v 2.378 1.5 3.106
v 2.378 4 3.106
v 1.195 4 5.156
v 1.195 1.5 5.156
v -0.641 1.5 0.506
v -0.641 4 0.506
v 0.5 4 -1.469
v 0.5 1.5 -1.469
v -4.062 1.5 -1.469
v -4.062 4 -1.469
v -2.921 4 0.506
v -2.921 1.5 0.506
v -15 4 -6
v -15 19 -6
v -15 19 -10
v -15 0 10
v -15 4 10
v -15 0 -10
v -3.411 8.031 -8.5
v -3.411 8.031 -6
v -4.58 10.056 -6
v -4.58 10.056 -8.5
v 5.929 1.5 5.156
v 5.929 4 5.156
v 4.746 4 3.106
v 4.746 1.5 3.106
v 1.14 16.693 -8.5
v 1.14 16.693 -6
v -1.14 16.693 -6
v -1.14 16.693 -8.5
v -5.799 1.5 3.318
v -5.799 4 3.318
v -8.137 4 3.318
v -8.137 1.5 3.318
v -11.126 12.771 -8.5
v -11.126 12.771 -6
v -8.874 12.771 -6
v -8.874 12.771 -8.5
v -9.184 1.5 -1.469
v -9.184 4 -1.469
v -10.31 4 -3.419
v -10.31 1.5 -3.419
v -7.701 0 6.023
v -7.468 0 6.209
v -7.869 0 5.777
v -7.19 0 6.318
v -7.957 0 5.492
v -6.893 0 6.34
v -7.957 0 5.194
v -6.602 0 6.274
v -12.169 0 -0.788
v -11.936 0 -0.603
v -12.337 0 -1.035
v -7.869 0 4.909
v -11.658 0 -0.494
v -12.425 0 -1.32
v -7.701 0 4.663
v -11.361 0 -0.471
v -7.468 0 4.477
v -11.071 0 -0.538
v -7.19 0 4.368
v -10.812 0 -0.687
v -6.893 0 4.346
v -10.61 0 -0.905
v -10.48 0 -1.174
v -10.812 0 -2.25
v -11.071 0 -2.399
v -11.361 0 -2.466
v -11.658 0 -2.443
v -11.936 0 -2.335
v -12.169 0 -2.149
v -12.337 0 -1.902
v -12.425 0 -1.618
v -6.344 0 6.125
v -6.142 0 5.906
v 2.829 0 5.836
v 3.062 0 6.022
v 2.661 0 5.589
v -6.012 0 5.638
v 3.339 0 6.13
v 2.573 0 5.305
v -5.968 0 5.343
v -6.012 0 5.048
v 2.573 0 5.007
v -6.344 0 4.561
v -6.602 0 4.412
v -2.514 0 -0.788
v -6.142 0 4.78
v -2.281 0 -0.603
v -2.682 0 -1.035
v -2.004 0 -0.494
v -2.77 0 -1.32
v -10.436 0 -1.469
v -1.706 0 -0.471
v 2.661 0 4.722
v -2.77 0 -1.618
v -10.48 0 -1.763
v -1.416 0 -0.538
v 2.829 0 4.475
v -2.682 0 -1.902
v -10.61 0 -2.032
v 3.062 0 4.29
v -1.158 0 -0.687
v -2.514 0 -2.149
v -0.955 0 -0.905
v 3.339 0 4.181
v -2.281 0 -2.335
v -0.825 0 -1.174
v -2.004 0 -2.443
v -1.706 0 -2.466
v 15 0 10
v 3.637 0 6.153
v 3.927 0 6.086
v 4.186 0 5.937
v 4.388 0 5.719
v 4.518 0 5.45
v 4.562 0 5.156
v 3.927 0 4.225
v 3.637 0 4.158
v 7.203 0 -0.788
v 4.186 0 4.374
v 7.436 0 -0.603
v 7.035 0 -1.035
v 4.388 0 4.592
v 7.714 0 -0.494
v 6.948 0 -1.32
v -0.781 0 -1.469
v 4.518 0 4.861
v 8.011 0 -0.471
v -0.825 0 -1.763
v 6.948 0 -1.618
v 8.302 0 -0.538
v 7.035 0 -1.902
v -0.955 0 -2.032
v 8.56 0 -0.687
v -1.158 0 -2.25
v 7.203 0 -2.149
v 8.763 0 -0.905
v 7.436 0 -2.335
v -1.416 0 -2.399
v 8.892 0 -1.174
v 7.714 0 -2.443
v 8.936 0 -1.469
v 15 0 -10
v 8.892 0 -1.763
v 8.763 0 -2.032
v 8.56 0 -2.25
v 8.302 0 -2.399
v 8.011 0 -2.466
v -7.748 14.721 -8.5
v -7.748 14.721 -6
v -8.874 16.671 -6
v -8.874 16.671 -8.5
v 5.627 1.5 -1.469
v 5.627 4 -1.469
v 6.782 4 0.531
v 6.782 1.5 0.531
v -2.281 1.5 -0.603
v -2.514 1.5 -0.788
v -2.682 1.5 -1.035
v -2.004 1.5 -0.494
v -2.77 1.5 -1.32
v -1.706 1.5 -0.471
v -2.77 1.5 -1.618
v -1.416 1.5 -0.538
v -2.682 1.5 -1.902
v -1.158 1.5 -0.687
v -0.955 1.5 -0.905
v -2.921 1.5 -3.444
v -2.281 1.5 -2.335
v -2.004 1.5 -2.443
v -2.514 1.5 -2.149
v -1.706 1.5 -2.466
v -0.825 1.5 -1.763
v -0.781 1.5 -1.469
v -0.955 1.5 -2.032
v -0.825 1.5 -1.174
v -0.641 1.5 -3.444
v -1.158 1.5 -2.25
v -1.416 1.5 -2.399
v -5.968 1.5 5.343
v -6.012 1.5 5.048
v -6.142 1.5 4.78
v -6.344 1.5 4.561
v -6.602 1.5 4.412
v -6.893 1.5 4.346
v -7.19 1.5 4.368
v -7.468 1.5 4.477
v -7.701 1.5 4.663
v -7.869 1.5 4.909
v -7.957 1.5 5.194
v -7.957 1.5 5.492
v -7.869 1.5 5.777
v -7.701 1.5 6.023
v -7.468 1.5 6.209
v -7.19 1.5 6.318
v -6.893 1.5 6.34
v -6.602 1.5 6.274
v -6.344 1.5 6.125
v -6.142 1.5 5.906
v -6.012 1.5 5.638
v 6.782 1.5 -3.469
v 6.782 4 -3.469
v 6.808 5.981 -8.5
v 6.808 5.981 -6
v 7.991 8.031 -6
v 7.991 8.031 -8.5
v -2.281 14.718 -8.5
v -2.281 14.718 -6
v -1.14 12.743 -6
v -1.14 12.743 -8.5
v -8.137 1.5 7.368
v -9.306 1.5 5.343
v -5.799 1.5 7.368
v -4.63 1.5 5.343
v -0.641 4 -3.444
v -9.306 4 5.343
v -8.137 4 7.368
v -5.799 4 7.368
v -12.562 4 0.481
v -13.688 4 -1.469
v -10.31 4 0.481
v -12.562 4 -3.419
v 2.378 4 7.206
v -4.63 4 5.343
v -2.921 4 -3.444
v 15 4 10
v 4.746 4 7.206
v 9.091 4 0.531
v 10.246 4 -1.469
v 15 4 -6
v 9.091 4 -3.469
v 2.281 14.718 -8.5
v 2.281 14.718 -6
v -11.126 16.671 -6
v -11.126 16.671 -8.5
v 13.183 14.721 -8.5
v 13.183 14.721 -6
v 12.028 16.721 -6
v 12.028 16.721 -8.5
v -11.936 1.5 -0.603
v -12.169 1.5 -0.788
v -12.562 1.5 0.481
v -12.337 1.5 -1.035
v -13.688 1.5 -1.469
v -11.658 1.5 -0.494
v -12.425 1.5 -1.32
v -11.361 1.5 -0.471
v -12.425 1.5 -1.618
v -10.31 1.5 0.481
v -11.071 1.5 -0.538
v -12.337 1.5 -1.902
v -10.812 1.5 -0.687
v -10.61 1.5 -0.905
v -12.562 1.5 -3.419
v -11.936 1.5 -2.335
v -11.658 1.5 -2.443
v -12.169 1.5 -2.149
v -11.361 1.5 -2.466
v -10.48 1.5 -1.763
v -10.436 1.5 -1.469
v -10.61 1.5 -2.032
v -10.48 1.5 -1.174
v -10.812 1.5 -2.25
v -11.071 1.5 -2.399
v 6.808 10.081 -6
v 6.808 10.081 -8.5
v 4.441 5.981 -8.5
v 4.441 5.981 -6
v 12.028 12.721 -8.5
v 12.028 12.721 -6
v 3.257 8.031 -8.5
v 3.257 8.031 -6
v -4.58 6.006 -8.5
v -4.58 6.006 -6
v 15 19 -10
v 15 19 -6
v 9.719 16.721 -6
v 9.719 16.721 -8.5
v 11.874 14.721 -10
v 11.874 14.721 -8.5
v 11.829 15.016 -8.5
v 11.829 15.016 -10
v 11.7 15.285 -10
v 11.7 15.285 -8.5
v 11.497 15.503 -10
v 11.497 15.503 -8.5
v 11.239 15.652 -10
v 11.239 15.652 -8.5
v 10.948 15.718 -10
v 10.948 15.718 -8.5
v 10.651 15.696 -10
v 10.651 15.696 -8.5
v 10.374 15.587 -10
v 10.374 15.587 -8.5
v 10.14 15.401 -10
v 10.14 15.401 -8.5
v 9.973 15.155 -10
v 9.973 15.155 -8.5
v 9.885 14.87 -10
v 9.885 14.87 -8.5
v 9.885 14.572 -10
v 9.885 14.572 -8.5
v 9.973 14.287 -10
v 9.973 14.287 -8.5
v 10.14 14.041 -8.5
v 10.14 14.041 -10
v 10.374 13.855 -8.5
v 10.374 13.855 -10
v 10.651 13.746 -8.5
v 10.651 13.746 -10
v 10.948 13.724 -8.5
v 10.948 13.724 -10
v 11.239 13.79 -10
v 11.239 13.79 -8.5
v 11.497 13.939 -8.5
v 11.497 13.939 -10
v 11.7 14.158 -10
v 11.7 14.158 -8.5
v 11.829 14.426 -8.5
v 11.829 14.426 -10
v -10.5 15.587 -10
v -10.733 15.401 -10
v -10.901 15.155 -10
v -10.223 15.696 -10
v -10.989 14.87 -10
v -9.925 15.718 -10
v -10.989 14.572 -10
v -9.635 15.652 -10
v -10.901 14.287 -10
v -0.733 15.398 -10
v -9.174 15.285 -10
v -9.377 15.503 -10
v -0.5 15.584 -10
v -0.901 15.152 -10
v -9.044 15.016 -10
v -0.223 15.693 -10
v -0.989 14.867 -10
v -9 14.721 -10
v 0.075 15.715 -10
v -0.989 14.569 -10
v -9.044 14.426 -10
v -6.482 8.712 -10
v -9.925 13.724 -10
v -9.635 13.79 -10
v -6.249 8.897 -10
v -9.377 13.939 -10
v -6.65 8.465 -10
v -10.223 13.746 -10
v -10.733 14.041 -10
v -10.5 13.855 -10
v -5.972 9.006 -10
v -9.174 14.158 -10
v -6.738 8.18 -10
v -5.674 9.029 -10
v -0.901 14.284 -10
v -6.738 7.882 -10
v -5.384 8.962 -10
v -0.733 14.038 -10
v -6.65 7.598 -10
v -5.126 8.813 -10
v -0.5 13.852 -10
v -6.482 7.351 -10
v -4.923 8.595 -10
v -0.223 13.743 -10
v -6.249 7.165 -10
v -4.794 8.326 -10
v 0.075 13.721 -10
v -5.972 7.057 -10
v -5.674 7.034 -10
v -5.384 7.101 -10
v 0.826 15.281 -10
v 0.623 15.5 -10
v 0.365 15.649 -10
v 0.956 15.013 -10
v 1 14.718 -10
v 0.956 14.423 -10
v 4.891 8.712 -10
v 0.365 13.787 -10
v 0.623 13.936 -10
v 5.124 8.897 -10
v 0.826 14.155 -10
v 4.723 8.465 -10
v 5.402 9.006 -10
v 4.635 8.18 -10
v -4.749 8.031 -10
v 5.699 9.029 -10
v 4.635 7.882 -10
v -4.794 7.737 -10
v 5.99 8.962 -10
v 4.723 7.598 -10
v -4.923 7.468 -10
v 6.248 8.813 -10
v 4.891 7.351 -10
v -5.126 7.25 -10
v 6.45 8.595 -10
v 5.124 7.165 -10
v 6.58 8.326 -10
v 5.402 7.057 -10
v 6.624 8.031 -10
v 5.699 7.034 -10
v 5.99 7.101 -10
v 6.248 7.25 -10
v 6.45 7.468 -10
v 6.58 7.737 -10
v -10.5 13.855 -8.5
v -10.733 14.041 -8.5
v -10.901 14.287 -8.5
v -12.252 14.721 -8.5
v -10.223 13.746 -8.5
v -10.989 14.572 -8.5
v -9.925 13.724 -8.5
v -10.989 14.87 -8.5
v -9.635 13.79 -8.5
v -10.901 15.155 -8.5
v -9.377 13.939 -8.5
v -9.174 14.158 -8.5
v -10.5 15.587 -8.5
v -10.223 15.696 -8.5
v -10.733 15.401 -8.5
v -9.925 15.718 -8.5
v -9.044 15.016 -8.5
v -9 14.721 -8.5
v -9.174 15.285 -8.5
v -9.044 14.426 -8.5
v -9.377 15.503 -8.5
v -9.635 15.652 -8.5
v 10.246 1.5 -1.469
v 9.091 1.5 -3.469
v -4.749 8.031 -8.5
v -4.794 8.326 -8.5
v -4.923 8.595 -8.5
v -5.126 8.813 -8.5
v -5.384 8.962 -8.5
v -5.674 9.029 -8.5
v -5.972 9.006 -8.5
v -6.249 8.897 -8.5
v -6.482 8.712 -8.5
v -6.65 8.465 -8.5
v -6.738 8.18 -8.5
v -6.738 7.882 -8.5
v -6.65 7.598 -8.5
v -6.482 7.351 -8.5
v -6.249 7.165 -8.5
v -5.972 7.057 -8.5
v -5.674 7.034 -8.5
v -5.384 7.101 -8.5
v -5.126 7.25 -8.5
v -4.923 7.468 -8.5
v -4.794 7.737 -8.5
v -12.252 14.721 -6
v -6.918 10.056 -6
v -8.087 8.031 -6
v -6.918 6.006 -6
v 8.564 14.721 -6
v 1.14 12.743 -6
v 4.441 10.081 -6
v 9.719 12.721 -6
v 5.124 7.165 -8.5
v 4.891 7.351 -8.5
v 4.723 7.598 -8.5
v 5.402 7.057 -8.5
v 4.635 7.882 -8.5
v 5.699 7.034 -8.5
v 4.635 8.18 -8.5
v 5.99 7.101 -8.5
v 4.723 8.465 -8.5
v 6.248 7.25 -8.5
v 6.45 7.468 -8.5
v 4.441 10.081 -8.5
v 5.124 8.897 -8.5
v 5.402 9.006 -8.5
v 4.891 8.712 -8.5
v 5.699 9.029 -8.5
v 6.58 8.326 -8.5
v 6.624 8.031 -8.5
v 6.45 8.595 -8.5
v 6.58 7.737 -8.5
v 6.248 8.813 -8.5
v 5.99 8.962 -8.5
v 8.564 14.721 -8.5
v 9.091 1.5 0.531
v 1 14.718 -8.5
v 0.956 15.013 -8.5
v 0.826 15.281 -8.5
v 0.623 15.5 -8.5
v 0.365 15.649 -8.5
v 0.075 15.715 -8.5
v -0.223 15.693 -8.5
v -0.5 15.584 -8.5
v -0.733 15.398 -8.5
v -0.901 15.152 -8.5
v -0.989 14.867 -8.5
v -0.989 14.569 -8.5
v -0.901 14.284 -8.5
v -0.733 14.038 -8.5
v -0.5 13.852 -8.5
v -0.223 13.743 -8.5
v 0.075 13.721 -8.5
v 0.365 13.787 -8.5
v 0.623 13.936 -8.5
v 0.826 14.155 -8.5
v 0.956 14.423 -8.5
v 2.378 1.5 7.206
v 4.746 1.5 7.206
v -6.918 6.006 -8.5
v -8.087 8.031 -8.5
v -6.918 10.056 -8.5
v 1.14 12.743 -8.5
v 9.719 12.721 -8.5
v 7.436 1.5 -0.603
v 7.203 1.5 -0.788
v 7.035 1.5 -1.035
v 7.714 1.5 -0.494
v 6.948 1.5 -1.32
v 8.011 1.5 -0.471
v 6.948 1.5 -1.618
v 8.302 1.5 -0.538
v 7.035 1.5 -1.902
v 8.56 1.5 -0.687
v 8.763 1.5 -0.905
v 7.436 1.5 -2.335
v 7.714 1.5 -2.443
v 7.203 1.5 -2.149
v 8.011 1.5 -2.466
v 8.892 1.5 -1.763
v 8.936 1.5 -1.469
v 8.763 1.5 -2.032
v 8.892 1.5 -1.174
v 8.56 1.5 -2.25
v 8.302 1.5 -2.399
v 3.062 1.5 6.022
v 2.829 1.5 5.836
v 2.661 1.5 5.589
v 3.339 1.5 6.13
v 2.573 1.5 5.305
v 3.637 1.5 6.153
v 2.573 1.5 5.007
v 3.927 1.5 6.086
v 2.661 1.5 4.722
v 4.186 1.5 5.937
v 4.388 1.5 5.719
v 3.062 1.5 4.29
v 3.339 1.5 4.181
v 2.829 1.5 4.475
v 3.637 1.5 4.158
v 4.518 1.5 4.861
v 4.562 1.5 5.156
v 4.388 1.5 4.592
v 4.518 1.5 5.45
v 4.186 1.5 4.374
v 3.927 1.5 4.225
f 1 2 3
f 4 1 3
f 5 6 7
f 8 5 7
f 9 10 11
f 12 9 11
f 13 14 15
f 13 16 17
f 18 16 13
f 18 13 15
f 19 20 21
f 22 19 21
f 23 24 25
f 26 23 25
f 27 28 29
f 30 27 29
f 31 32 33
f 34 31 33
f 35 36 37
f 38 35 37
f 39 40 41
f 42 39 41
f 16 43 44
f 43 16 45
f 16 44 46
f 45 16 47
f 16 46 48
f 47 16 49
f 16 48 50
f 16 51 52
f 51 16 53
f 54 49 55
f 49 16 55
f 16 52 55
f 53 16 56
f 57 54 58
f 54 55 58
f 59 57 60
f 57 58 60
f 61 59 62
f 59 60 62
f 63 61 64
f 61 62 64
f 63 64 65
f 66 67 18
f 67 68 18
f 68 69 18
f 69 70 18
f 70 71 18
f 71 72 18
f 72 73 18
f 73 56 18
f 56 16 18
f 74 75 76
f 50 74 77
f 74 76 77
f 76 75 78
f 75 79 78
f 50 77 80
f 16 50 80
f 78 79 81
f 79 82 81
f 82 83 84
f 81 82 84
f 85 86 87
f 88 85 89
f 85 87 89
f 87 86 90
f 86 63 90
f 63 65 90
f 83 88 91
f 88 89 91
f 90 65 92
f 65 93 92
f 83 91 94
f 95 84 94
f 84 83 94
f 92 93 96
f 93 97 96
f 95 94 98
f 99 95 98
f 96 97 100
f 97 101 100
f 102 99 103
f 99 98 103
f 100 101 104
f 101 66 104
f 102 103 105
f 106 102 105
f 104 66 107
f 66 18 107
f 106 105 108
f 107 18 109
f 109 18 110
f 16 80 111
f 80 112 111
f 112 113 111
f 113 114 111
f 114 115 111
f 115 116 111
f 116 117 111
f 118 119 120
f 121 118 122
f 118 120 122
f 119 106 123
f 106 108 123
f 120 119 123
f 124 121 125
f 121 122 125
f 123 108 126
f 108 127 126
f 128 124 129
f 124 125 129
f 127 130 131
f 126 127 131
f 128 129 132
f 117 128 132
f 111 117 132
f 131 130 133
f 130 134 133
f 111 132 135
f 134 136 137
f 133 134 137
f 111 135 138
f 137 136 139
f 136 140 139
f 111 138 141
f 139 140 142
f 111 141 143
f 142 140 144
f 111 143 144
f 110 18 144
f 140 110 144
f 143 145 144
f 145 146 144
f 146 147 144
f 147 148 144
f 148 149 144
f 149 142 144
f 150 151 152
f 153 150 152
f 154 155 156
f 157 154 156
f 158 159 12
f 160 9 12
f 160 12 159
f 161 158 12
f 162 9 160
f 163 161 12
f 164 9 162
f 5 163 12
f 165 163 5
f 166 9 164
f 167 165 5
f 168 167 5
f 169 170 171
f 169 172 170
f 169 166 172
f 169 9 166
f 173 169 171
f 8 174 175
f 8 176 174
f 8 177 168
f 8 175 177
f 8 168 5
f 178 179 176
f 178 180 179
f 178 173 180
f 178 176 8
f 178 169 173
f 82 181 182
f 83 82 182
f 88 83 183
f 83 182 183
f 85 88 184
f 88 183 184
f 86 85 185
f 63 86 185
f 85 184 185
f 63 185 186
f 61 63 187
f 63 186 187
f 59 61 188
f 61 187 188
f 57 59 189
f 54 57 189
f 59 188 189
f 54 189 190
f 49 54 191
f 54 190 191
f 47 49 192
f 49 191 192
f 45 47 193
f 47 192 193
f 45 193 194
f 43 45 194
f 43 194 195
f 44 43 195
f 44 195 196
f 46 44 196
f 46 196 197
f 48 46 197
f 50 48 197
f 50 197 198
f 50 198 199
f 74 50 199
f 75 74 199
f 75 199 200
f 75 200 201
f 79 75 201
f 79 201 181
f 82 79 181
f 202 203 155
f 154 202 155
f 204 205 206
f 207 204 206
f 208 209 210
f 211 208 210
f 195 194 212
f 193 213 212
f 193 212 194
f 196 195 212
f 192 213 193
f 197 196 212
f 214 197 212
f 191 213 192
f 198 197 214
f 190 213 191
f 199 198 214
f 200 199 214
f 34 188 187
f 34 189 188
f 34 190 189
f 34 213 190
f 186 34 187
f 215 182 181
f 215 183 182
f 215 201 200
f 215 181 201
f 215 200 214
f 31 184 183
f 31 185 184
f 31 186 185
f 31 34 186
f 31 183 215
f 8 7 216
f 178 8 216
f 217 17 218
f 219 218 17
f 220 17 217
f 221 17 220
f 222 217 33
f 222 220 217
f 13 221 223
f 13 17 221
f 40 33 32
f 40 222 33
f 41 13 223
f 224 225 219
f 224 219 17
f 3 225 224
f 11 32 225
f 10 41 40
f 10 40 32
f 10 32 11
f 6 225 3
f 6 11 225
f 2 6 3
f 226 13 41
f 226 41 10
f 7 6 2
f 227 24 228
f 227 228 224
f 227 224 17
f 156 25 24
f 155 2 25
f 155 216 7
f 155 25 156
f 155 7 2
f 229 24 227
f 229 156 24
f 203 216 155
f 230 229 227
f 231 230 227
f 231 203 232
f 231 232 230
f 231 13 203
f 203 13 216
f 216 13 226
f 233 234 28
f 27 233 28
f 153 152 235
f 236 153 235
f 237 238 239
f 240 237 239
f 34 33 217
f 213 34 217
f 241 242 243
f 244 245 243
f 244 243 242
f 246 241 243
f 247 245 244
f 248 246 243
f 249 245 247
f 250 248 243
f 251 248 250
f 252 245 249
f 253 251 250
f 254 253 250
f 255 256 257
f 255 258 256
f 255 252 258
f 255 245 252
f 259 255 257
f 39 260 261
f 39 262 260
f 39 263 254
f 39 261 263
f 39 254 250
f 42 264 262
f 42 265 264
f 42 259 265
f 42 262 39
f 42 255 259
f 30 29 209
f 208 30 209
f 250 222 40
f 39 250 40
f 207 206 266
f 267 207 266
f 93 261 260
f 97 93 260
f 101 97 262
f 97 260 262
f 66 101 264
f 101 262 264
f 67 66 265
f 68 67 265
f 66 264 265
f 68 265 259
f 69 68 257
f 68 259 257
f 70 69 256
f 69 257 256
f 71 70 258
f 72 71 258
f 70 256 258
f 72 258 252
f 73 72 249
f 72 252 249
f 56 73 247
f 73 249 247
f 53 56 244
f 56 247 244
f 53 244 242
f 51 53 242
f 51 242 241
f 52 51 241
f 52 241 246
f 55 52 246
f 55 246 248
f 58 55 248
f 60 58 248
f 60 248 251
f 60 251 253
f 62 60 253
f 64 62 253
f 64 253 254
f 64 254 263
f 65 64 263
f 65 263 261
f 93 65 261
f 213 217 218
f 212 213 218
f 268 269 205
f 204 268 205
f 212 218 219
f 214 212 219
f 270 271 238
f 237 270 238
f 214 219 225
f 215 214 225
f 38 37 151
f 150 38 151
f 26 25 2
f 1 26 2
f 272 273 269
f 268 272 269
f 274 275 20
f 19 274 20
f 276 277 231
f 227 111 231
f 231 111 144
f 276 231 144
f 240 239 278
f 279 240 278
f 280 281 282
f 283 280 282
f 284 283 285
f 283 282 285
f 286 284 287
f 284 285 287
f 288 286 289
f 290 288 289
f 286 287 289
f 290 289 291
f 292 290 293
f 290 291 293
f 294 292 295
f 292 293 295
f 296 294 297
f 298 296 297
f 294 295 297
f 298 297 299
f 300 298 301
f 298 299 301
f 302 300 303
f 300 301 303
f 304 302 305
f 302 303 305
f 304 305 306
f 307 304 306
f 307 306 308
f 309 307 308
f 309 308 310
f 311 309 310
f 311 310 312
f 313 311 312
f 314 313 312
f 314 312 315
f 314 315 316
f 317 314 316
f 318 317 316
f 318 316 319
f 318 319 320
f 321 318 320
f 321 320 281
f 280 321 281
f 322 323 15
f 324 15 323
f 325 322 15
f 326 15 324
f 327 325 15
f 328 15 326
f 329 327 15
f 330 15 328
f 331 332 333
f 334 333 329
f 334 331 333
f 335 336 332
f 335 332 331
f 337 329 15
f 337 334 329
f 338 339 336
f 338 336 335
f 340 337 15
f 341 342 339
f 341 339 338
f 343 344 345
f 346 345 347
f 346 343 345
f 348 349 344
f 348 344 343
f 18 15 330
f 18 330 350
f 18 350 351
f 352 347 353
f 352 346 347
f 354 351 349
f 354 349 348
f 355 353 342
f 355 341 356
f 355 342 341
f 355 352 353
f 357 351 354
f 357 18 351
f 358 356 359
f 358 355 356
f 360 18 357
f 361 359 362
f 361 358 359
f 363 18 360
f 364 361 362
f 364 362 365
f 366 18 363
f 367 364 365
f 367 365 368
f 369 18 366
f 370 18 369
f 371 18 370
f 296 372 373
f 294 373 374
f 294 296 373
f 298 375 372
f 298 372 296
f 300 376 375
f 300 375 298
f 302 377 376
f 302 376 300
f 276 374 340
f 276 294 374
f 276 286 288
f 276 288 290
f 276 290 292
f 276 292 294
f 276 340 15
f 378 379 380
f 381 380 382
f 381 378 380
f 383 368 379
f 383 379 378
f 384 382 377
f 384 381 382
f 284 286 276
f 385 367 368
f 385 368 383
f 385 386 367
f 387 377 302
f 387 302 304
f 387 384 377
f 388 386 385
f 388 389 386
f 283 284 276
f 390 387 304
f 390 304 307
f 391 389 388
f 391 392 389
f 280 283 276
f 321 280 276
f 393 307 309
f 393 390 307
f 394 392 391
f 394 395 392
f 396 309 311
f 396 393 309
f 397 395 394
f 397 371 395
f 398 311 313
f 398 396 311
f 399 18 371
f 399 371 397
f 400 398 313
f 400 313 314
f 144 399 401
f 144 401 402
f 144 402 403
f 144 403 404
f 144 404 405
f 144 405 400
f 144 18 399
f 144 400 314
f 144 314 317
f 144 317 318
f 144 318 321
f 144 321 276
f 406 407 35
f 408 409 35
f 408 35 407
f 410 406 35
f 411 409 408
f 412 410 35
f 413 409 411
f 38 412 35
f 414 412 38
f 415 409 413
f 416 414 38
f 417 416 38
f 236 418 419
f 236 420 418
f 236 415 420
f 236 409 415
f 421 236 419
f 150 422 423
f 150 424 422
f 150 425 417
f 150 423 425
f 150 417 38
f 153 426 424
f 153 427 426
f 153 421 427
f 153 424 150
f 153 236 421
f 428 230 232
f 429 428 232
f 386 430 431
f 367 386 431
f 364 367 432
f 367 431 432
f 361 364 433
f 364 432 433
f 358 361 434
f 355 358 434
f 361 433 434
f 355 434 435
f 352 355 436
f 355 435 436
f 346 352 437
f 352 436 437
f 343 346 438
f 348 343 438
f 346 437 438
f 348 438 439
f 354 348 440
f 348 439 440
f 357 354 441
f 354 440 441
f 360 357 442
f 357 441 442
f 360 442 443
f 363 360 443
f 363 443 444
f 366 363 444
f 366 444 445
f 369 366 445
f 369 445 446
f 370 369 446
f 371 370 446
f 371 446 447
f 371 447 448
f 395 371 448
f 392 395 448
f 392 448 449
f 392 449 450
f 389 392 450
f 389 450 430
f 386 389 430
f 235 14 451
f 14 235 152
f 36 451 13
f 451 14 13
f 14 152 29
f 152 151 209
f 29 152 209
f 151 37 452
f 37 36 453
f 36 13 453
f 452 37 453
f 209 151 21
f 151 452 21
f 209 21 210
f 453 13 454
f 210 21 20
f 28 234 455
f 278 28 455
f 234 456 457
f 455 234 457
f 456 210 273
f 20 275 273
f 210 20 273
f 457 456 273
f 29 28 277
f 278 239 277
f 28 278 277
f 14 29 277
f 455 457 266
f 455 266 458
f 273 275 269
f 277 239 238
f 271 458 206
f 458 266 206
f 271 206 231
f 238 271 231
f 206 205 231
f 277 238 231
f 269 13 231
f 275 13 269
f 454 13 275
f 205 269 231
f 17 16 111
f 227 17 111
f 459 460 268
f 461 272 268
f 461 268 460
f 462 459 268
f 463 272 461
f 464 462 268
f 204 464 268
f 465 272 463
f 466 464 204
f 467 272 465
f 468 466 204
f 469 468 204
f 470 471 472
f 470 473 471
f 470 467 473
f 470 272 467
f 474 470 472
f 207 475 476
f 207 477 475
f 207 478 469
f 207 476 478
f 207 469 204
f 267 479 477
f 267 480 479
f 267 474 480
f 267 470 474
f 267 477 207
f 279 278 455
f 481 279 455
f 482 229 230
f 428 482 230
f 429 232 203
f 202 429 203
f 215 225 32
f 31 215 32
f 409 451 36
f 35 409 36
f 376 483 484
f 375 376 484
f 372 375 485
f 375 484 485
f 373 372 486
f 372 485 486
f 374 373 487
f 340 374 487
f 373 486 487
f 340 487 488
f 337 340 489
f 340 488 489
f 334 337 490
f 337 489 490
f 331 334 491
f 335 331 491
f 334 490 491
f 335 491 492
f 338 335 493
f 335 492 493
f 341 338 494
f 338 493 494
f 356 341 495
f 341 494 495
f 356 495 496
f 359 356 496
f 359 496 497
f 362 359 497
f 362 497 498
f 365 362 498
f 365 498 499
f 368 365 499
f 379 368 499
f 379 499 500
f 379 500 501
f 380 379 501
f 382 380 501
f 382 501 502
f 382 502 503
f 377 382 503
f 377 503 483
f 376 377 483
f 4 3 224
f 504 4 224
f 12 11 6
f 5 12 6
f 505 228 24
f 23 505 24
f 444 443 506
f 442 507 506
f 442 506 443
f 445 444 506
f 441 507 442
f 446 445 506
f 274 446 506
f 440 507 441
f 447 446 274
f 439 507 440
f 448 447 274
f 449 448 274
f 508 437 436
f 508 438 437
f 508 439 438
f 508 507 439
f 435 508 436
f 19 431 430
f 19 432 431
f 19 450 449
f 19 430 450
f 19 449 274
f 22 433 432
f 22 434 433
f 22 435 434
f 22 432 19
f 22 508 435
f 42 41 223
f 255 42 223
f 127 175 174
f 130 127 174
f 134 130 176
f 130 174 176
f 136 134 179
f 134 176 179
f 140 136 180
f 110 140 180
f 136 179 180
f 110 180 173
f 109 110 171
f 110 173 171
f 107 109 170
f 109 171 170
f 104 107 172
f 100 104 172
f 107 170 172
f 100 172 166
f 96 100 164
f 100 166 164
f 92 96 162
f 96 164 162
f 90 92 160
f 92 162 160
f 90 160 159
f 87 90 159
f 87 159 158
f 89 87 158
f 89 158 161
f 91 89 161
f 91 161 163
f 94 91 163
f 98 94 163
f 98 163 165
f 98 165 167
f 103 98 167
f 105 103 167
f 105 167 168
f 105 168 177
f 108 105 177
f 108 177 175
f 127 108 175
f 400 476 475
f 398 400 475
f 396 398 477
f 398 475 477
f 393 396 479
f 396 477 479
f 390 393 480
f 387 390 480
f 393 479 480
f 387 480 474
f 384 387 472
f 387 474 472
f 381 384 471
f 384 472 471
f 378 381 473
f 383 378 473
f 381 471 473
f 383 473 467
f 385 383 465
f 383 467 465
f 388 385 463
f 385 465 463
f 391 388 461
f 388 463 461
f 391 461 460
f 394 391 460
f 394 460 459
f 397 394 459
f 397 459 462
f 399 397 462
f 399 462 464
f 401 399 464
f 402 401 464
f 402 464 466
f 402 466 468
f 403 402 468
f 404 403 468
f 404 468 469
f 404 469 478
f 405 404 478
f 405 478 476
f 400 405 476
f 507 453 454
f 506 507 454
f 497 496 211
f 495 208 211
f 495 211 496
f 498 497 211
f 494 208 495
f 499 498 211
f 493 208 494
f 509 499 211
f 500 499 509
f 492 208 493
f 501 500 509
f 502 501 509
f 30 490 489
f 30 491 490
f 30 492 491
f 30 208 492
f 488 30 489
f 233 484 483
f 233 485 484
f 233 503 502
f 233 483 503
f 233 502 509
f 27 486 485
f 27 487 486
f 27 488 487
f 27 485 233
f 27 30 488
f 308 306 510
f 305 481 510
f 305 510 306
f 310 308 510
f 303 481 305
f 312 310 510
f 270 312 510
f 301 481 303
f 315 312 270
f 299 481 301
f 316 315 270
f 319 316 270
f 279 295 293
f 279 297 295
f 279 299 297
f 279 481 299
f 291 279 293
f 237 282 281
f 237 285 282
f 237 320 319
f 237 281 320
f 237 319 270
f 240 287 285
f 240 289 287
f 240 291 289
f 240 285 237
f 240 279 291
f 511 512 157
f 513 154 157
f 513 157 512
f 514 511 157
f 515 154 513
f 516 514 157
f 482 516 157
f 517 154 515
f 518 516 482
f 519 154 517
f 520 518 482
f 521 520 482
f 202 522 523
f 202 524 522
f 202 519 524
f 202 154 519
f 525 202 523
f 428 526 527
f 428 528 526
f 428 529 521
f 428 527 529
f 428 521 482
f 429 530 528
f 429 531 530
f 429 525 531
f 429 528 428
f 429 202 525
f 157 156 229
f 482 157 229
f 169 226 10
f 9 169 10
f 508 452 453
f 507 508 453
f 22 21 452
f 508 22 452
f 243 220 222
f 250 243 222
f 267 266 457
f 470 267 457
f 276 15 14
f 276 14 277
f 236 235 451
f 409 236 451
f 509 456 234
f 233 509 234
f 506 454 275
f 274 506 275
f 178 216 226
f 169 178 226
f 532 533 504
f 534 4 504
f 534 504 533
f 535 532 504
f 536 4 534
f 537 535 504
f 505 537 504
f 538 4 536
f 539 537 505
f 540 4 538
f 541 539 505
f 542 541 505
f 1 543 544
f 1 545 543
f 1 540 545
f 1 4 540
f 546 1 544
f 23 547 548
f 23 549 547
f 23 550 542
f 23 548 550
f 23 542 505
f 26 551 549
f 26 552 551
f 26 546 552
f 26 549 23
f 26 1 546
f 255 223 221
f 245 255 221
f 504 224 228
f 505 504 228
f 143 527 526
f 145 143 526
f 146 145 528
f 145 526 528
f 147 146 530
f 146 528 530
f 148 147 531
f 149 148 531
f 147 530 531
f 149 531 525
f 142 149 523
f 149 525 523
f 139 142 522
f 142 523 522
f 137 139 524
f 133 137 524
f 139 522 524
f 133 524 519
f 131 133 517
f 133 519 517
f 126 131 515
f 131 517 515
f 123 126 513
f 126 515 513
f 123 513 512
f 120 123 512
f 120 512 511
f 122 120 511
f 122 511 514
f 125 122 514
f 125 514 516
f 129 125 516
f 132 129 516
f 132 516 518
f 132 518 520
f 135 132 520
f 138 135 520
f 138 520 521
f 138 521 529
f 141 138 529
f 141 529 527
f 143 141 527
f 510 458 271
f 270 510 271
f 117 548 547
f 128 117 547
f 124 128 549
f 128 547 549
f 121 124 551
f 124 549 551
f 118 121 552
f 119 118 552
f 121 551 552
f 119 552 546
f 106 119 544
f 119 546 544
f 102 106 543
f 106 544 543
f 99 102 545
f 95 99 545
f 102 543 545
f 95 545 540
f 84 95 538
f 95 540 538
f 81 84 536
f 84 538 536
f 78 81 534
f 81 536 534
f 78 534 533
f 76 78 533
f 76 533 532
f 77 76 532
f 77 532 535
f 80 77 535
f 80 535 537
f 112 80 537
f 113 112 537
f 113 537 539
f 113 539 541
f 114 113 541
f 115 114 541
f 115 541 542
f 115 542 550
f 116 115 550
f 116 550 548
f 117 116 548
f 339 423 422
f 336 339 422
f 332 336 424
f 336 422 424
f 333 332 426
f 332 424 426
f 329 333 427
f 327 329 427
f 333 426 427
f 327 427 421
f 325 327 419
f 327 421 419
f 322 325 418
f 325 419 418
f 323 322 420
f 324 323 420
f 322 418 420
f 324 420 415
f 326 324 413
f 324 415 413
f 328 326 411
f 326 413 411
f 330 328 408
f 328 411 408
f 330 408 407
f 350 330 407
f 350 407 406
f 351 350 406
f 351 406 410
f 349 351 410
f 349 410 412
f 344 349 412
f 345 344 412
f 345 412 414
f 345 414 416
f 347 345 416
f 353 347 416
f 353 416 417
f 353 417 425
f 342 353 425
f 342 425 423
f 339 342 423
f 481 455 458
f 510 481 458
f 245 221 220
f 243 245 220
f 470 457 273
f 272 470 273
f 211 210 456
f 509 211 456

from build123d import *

# Parameters (mm, degrees)
SKETCH1_W               = 30
SKETCH1_H               = 20
BOSS_EXTRUDE1_DEPTH     = 4
SKETCH2_W               = 30
SKETCH2_H               = 4
BOSS_EXTRUDE2_DEPTH     = 15
CUT_EXTRUDE1_DEPTH      = 2.5
SKETCH4_R               = 1
CUT_EXTRUDE2_DEPTH      = 19.5
CUT_EXTRUDE2_DEPTH_BACK = 2.5
CUT_EXTRUDE3_DEPTH      = 16
CUT_EXTRUDE3_DEPTH_BACK = 2.5
SKETCH6_R               = 1
CUT_EXTRUDE4_DEPTH      = 18.5
CUT_EXTRUDE4_DEPTH_BACK = 2.5


with BuildPart() as part:
    # Sketch1 → Boss-Extrude1 (new body)
    with BuildSketch(Plane(origin=(0, 0, 0), x_dir=(1, 0, 0), z_dir=(0, 1, 0))):
        Rectangle(SKETCH1_W, SKETCH1_H)
    extrude(amount=BOSS_EXTRUDE1_DEPTH)

    # Sketch2 → Boss-Extrude2 (add)
    with BuildSketch(Plane(origin=(0, 4, 0), x_dir=(1, 0, 0), z_dir=(0, 1, 0))):
        with Locations((0, 8)):
            Rectangle(SKETCH2_W, SKETCH2_H)
    extrude(amount=BOSS_EXTRUDE2_DEPTH)

    # Sketch3 → Cut-Extrude1 (cut)
    with BuildSketch(Plane.XY.offset(-6)):
        Polygon((-8.874166975, 12.771236672), (-7.74833395, 14.721236672), (-8.874166975, 16.671236672), (-11.125833025, 16.671236672), (-12.25166605, 14.721236672), (-11.125833025, 12.771236672), align=None)
        Polygon((1.140266782, 12.743045001), (2.280533563, 14.718045001), (1.140266782, 16.693045001), (-1.140266782, 16.693045001), (-2.280533563, 14.718045001), (-1.140266782, 12.743045001), align=None)
        Polygon((12.028231439, 12.721236672), (13.182931977, 14.721236672), (12.028231439, 16.721236672), (9.718830362, 16.721236672), (8.564129823, 14.721236672), (9.718830362, 12.721236672), align=None)
        Polygon((-4.580088939, 6.006448413), (-3.410954644, 8.031448413), (-4.580088939, 10.056448413), (-6.91835753, 10.056448413), (-8.087491825, 8.031448413), (-6.91835753, 6.006448413), align=None)
        Polygon((6.807808173, 5.981448413), (7.991376224, 8.031448413), (6.807808173, 10.081448413), (4.440672069, 10.081448413), (3.257104017, 8.031448413), (4.440672069, 5.981448413), align=None)
    extrude(amount=-CUT_EXTRUDE1_DEPTH, mode=Mode.SUBTRACT)

    # Sketch4 → Cut-Extrude2 (cut, two sides)
    with BuildSketch(Plane.XY.offset(-8.5)) as cut_extrude2_sk:
        with Locations((-10, 14.721236672)):
            Circle(SKETCH4_R)
        with Locations((0, 14.718045001)):
            Circle(SKETCH4_R)
        with Locations((10.8735309, 14.721236672)):
            Circle(SKETCH4_R)
        with Locations((5.624240121, 8.031448413)):
            Circle(SKETCH4_R)
        with Locations((-5.749223235, 8.031448413)):
            Circle(SKETCH4_R)
    extrude(amount=CUT_EXTRUDE2_DEPTH, mode=Mode.SUBTRACT)
    extrude(cut_extrude2_sk.sketch, amount=-CUT_EXTRUDE2_DEPTH_BACK, mode=Mode.SUBTRACT)

    # Sketch5 → Cut-Extrude3 (cut, two sides)
    with BuildSketch(Plane(origin=(0, 4, 0), x_dir=(1, 0, 0), z_dir=(0, 1, 0))) as cut_extrude3_sk:
        Polygon((-10.310121887, -0.481448413), (-9.184288862, 1.468551587), (-10.310121887, 3.418551587), (-12.561787937, 3.418551587), (-13.687620962, 1.468551587), (-12.561787937, -0.481448413), align=None)
        Polygon((-0.64074259, -0.506448413), (0.499524192, 1.468551587), (-0.64074259, 3.443551587), (-2.921276153, 3.443551587), (-4.061542935, 1.468551587), (-2.921276153, -0.506448413), align=None)
        Polygon((9.091128264, -0.531448413), (10.245828803, 1.468551587), (9.091128264, 3.468551587), (6.781727188, 3.468551587), (5.627026649, 1.468551587), (6.781727188, -0.531448413), align=None)
        Polygon((-5.798674299, -7.368028115), (-4.629540004, -5.343028115), (-5.798674299, -3.318028115), (-8.136942889, -3.318028115), (-9.306077184, -5.343028115), (-8.136942889, -7.368028115), align=None)
        Polygon((4.745586795, -7.205553444), (5.929154847, -5.155553444), (4.745586795, -3.105553444), (2.378450691, -3.105553444), (1.194882639, -5.155553444), (2.378450691, -7.205553444), align=None)
    extrude(amount=CUT_EXTRUDE3_DEPTH, mode=Mode.SUBTRACT)
    extrude(cut_extrude3_sk.sketch, amount=-CUT_EXTRUDE3_DEPTH_BACK, mode=Mode.SUBTRACT)

    # Sketch6 → Cut-Extrude4 (cut, two sides)
    with BuildSketch(Plane(origin=(0, 1.5, 0), x_dir=(1, 0, 0), z_dir=(0, 1, 0))) as cut_extrude4_sk:
        with Locations((-11.435954912, 1.468551587)):
            Circle(SKETCH6_R)
        with Locations((-1.781009372, 1.468551587)):
            Circle(SKETCH6_R)
        with Locations((7.936427726, 1.468551587)):
            Circle(SKETCH6_R)
        with Locations((3.562018743, -5.155553444)):
            Circle(SKETCH6_R)
        with Locations((-6.967808594, -5.343028115)):
            Circle(SKETCH6_R)
    extrude(amount=CUT_EXTRUDE4_DEPTH, mode=Mode.SUBTRACT)
    extrude(cut_extrude4_sk.sketch, amount=-CUT_EXTRUDE4_DEPTH_BACK, mode=Mode.SUBTRACT)


solid = part.part
